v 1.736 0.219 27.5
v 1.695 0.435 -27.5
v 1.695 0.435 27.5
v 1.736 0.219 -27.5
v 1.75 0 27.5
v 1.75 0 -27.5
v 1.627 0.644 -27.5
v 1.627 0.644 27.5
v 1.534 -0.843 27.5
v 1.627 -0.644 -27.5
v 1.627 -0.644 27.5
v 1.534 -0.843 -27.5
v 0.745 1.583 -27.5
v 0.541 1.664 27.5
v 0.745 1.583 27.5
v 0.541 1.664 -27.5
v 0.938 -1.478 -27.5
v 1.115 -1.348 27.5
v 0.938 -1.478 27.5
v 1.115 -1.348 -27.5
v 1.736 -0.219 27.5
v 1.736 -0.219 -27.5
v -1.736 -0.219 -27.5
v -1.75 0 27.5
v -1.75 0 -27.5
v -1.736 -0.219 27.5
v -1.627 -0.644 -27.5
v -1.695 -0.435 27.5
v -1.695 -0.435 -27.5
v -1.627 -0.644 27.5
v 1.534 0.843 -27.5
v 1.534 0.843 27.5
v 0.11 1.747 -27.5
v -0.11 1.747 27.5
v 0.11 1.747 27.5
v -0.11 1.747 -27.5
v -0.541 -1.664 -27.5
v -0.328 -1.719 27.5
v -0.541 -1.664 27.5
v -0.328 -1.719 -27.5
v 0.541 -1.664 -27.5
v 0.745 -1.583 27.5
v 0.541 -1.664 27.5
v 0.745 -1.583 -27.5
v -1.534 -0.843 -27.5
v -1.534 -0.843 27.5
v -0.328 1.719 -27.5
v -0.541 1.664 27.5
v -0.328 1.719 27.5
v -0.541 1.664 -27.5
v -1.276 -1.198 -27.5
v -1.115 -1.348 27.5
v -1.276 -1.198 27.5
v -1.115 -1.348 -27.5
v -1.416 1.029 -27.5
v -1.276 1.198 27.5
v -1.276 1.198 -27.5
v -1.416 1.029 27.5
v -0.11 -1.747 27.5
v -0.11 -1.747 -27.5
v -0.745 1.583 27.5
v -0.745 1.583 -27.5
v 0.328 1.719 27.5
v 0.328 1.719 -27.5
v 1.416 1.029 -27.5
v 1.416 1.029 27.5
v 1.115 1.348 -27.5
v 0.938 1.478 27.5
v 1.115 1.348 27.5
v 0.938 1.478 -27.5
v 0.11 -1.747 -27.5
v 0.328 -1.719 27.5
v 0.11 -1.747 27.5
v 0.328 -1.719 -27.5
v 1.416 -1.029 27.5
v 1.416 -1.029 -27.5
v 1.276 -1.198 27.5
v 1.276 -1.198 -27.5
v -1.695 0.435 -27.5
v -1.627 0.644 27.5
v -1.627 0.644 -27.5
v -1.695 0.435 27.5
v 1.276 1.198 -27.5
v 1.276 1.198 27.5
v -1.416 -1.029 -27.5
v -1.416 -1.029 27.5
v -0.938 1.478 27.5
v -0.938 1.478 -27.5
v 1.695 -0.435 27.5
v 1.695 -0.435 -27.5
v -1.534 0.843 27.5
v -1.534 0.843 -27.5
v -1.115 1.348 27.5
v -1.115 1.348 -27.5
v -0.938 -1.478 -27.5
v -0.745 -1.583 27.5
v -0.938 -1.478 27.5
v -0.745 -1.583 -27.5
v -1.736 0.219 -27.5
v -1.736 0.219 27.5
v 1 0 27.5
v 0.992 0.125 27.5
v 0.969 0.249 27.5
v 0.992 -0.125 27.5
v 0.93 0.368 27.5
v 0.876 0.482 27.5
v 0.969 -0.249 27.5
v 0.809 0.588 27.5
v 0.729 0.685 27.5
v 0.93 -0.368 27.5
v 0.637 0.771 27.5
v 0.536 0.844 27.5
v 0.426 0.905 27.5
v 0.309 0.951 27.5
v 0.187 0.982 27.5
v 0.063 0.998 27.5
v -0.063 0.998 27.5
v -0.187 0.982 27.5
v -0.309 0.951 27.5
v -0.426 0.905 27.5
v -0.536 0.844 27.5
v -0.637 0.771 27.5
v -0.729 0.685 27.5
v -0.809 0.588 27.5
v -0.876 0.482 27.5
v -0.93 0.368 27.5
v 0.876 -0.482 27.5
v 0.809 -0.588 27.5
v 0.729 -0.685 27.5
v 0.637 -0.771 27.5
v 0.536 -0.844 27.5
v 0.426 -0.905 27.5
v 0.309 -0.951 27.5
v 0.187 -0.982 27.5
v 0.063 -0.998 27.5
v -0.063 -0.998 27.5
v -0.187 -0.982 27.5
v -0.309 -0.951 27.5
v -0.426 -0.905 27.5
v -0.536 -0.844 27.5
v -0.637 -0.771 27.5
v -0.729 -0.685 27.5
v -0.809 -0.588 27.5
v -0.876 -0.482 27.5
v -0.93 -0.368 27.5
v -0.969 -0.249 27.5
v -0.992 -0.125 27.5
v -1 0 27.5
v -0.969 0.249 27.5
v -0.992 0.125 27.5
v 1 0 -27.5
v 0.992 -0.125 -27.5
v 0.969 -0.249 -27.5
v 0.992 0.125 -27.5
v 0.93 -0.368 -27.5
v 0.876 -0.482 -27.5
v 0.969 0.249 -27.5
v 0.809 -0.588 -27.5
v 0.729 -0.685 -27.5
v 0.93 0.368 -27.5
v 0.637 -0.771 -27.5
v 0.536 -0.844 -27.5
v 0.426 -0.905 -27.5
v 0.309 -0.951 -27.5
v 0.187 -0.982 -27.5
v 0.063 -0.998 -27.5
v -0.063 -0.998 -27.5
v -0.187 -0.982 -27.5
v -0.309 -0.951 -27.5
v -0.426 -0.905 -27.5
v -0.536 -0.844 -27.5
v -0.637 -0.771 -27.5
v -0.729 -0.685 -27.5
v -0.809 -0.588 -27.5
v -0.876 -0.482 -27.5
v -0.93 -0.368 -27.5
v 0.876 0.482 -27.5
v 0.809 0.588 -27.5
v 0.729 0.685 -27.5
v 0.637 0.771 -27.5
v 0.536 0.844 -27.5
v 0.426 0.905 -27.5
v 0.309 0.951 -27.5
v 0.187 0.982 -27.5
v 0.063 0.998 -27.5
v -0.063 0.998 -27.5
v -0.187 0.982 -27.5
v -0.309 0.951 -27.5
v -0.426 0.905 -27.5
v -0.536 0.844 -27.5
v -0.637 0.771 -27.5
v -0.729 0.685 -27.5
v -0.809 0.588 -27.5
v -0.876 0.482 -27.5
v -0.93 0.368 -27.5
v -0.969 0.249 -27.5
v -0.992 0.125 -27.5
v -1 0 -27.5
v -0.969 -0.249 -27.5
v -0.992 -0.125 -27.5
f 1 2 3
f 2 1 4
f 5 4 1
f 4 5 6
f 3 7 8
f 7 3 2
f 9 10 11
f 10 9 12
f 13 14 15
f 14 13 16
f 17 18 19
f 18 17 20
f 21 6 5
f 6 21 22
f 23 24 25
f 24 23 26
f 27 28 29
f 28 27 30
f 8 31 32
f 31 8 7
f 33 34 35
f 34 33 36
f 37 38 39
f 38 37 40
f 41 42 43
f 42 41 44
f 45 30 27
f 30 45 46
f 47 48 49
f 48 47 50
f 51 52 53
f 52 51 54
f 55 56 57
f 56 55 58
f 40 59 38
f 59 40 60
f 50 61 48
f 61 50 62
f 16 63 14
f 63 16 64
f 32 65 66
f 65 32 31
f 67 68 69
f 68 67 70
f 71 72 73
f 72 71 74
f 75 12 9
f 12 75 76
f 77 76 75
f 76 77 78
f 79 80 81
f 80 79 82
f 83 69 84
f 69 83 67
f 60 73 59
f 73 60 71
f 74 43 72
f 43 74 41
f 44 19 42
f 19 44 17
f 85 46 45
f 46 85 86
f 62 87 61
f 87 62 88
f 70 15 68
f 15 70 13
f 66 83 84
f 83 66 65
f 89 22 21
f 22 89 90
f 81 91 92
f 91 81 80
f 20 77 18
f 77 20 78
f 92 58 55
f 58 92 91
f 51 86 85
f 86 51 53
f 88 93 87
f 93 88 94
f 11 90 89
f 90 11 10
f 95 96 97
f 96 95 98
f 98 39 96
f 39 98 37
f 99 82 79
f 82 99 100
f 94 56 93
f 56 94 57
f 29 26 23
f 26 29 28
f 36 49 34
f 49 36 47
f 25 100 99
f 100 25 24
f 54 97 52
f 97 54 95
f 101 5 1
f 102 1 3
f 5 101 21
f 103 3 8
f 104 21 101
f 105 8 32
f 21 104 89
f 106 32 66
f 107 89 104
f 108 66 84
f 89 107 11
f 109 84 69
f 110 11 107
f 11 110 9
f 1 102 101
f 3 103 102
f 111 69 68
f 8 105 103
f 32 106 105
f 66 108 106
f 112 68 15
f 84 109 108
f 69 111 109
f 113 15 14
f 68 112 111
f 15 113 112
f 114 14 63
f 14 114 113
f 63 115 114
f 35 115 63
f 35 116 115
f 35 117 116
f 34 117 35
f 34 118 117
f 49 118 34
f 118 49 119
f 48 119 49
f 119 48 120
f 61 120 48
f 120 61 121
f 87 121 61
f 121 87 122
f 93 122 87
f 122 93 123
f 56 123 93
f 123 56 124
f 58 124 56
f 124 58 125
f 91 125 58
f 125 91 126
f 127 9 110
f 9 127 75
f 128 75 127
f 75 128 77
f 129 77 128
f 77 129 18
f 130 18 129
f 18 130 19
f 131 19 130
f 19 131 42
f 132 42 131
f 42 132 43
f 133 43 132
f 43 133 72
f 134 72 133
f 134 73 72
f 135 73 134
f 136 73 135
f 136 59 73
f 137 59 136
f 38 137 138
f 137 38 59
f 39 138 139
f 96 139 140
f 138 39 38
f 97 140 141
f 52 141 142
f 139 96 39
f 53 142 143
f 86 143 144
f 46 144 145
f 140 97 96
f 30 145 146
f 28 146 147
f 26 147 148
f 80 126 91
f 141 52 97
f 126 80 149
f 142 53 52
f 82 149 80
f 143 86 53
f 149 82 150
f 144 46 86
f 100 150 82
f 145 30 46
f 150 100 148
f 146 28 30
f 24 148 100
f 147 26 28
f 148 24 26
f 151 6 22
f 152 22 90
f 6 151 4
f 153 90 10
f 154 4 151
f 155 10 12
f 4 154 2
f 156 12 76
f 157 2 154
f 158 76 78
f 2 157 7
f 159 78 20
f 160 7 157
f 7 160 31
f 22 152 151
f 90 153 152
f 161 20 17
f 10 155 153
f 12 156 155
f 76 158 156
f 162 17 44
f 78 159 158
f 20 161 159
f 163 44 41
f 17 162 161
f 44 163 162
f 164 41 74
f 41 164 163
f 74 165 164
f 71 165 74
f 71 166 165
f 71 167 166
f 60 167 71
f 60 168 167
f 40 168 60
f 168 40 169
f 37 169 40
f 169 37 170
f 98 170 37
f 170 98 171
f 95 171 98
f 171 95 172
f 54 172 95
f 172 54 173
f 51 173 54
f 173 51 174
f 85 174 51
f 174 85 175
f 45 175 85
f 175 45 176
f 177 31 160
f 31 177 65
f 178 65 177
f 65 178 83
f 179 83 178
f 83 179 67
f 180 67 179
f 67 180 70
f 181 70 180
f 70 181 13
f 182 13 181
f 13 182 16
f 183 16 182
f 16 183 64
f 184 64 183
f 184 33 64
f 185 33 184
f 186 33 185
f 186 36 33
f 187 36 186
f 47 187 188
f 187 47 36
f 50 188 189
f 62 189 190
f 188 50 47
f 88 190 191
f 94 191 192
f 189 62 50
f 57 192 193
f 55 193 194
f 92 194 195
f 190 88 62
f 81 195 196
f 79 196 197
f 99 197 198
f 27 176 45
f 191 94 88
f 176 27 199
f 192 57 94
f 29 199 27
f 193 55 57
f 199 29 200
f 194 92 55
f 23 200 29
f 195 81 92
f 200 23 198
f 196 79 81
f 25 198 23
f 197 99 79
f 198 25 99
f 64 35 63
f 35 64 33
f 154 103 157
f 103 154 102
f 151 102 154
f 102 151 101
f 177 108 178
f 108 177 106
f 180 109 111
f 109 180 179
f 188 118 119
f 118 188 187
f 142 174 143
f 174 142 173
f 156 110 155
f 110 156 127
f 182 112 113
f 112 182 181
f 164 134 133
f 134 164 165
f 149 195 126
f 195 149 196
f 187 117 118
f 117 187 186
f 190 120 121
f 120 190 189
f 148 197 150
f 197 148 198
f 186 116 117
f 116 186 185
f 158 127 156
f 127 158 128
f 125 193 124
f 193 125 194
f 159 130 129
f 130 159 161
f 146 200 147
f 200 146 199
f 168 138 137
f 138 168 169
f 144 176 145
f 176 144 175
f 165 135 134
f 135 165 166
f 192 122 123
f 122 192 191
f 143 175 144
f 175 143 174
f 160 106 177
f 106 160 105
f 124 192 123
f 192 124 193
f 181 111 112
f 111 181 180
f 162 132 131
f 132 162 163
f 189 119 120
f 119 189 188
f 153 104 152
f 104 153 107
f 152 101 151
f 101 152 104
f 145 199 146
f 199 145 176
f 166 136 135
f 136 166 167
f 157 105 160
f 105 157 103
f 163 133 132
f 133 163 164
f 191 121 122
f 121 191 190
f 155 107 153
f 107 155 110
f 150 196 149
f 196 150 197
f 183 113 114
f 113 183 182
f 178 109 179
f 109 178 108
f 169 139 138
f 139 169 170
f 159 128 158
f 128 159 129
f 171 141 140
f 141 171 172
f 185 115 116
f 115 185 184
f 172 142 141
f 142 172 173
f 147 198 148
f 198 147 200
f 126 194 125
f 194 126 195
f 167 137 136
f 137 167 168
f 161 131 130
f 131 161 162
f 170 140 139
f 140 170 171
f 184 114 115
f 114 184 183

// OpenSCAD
$fn = 50;


difference() {
	union() {
		translate(v = [0, 0, -27.5000000000]) {
			cylinder(h = 55, r = 1.7500000000);
		}
	}
	union() {
		translate(v = [0, 0, -100.0000000000]) {
			cylinder(h = 200, r = 1.0000000000);
		}
	}
}
